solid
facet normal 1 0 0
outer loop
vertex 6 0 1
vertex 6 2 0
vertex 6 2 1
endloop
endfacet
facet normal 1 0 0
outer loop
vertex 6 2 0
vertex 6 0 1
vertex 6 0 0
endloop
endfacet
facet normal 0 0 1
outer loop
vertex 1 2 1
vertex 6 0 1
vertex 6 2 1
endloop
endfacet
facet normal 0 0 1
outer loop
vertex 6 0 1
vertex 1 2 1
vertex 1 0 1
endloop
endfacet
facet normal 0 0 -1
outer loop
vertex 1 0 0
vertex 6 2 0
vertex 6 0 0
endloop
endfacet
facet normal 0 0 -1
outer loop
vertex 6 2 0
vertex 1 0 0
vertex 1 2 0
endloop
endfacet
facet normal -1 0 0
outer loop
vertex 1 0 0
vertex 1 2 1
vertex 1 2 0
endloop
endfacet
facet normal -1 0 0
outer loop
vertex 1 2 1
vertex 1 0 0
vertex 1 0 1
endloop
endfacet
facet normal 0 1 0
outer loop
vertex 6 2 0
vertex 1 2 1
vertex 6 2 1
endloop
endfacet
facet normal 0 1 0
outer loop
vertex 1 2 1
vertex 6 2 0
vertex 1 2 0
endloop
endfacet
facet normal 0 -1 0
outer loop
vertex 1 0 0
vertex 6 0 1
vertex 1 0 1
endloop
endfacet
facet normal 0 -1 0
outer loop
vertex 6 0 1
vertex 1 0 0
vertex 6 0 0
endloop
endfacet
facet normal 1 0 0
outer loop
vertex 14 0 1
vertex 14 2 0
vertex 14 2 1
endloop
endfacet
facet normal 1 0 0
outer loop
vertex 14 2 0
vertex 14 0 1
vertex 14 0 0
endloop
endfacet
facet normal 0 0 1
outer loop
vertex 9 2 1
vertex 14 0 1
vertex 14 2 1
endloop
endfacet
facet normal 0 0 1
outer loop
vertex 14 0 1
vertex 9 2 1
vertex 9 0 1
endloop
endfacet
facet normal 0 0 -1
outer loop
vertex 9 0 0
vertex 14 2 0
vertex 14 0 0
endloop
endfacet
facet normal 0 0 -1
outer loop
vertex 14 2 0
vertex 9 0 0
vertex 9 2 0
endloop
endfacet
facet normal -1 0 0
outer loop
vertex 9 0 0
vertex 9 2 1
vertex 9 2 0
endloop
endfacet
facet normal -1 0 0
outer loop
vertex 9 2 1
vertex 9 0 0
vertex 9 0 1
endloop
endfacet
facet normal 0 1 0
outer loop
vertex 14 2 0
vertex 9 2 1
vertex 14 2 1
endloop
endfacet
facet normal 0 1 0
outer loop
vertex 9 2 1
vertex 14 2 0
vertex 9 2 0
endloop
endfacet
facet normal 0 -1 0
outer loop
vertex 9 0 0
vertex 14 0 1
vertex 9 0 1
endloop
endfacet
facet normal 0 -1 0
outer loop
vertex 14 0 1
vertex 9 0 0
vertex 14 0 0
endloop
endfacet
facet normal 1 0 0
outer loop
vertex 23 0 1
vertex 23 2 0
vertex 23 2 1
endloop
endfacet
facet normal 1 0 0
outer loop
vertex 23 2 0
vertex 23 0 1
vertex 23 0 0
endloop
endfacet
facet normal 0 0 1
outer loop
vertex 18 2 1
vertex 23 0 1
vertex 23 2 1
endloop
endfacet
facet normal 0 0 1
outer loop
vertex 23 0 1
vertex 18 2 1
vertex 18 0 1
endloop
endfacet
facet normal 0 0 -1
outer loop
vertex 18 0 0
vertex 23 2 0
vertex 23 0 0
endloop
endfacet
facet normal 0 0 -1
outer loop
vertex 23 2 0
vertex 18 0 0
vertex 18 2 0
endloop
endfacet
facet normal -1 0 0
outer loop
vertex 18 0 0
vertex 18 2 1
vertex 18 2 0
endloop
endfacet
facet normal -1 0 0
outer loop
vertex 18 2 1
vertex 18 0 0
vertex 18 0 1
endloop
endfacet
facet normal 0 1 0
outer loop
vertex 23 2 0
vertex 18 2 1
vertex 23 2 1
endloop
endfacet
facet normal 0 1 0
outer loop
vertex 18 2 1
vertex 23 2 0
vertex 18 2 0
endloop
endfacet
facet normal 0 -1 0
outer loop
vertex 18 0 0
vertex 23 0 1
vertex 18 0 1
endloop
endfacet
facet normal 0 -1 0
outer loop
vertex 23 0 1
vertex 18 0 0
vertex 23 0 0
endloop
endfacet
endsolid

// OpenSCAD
// Original synthetic CLI compatibility fixture. No user SCAD is executed.
/* [Palette] */
paint_hex = "#112233";
paint_rgb = [0.2, 0.3, 0.4];
paint_rgba = [0.6, 0.4, 0.2, 0.75];
/* [Geometry] */
width = 5;
position = [9, 0, 0];

echo("PT_HEX", paint_hex);
echo("PT_RGB", paint_rgb);
echo("PT_RGBA", paint_rgba);
echo("PT_WIDTH", width);
echo("PT_POSITION", position);
color(paint_hex) translate([1, 0, 0]) cube([width, 2, 1], center=false);
color(paint_rgb) translate(position) cube([width, 2, 1], center=false);
color(paint_rgba) translate(2 * position) cube([width, 2, 1], center=false);
